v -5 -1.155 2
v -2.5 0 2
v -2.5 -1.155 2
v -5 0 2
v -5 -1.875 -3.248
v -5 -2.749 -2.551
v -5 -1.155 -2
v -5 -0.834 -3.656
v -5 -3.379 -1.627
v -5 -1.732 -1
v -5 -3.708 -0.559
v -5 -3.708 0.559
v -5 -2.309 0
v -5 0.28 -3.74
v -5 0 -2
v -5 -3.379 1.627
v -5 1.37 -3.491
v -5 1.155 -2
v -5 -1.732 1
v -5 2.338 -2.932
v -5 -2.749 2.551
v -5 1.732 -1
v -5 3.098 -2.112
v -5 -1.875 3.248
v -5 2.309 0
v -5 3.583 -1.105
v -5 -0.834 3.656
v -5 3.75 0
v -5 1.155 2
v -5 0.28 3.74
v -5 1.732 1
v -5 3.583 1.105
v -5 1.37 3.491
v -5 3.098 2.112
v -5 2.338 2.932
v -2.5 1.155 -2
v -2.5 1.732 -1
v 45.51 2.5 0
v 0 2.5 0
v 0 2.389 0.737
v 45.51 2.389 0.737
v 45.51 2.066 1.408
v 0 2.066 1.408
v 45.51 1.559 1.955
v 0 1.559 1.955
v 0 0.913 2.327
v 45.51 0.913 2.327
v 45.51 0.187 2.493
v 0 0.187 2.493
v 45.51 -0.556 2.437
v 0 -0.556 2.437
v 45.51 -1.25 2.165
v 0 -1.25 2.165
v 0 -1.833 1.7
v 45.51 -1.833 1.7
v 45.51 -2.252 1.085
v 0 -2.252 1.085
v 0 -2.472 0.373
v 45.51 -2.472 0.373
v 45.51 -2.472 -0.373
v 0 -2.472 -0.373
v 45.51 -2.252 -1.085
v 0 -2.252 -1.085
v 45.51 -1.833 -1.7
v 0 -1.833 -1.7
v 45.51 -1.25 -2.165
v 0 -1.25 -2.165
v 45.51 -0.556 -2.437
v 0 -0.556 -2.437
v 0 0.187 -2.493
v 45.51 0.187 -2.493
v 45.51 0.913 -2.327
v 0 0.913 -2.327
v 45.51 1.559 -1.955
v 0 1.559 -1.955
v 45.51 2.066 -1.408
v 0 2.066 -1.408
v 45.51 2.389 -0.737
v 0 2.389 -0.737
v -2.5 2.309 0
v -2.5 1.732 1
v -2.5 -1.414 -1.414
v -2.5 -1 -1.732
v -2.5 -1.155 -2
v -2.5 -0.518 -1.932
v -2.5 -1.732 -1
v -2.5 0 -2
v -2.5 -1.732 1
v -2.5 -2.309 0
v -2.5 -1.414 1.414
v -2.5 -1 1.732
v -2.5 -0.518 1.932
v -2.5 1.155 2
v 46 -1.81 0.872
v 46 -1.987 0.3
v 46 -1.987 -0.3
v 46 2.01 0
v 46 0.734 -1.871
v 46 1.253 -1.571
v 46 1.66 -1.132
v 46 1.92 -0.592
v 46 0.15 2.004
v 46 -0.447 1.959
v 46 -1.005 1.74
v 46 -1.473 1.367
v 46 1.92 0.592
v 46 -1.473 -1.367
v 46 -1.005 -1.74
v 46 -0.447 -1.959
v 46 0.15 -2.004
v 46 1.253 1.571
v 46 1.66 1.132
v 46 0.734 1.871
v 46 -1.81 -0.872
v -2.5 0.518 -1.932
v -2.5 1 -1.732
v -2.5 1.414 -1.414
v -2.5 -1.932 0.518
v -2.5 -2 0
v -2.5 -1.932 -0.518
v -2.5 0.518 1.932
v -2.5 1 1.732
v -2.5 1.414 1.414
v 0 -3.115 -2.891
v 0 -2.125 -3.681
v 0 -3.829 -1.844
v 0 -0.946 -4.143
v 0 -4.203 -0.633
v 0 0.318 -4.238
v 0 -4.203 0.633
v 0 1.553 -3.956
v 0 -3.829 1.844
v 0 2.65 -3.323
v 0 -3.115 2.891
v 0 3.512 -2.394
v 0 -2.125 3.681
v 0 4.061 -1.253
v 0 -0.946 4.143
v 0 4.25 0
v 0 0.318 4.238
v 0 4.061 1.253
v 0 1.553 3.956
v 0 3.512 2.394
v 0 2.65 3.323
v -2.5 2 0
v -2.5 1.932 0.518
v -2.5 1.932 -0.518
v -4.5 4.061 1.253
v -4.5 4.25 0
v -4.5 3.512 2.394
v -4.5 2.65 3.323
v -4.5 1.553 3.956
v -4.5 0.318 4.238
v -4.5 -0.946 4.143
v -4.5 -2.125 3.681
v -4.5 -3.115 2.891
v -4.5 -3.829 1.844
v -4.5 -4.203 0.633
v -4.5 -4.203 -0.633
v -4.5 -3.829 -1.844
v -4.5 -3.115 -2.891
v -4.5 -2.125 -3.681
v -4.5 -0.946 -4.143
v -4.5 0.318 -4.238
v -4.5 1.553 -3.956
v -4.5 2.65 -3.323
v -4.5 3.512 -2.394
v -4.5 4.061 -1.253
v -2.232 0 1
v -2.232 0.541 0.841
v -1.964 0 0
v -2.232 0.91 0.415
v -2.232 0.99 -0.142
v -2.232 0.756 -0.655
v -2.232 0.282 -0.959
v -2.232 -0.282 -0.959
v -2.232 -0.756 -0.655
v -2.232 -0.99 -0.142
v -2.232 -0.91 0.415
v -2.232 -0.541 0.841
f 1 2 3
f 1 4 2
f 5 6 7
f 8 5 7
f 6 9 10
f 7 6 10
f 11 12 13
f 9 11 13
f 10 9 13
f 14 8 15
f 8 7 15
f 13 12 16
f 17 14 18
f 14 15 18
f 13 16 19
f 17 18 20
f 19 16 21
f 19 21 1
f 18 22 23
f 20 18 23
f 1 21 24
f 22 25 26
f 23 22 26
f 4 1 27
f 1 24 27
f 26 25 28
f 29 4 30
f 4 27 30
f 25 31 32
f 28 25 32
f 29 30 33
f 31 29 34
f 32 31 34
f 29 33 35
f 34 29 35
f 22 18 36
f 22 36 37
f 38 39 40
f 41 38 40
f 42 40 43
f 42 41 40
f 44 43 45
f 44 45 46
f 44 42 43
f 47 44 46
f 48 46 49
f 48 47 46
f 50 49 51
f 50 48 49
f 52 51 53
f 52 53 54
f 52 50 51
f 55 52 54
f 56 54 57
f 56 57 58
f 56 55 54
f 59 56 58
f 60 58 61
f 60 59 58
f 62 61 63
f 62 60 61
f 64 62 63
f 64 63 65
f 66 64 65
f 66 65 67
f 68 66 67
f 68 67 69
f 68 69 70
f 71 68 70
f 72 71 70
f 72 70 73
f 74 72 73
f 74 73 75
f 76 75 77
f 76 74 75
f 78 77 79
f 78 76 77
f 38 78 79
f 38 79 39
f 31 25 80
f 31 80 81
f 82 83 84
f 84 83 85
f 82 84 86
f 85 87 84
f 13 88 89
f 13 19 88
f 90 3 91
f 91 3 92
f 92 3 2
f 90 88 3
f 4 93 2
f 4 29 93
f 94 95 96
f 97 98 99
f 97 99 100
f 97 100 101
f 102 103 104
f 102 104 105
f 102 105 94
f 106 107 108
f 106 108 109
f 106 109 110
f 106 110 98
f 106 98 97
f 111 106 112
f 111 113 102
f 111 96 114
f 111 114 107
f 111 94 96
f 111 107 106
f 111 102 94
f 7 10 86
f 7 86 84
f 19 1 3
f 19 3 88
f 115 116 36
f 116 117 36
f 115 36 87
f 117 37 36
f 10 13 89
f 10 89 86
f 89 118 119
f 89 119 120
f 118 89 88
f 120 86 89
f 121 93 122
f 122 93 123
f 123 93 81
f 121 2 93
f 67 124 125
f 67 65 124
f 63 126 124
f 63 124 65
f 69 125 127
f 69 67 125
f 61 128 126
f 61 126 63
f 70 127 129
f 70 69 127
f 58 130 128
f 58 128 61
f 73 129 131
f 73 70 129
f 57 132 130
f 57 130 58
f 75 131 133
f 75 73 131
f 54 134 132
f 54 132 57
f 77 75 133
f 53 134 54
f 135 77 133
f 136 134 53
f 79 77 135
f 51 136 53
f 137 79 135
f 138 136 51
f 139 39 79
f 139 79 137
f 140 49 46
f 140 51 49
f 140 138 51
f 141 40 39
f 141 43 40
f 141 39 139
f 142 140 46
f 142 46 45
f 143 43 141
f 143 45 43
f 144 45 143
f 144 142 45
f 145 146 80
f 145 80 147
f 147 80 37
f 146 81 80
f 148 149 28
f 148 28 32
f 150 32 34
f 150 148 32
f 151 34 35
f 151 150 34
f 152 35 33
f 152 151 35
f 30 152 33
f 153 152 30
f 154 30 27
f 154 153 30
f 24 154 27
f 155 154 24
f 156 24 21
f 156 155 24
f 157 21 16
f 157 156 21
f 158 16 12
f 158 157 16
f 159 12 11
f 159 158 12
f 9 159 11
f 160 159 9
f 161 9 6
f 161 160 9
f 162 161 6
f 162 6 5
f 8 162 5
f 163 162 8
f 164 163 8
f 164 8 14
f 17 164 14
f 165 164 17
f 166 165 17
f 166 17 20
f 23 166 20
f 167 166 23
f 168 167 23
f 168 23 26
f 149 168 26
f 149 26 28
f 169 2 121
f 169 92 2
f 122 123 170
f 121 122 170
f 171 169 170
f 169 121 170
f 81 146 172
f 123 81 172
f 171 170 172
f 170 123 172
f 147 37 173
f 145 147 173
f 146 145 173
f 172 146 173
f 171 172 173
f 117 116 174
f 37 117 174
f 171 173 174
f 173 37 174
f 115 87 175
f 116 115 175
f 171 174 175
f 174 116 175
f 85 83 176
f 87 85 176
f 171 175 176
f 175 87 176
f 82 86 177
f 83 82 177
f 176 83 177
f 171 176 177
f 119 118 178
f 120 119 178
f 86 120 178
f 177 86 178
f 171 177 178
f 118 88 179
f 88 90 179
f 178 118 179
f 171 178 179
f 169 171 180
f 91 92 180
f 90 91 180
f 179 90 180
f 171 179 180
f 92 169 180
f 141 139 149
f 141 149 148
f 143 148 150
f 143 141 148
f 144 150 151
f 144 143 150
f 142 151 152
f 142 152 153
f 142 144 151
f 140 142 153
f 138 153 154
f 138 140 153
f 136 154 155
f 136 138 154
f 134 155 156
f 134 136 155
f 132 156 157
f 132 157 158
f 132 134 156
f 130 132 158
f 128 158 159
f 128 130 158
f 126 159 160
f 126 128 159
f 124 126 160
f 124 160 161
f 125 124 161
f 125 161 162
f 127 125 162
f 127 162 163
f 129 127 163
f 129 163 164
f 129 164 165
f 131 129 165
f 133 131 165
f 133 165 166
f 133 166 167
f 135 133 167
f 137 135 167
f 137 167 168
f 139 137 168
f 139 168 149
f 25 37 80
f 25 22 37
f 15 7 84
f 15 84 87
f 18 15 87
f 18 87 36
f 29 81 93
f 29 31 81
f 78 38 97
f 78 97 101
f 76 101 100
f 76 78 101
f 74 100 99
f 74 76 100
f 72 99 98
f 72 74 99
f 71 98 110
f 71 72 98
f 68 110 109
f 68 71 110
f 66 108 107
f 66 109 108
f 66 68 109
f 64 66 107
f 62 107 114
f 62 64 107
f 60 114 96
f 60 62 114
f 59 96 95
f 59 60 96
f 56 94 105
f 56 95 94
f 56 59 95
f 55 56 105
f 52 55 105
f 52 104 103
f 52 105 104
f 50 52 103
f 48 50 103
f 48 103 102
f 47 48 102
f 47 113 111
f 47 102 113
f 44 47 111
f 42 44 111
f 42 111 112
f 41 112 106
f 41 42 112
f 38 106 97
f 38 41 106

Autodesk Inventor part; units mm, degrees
sketch "Sketch_1" plane through (0, 0, 0) normal (0, 0, 1) x (1, 0, 0)
  line L0 (22, 0) -> (-5, 0)
  line L1 (-5, 0) -> (-5, 3.75)
  line L2 (-5, 3.75) -> (-4.5, 4.25)
  line L3 (-4.5, 4.25) -> (0, 4.25)
  line L4 (0, 4.25) -> (0, 2.5)
  line L5 (0, 2.5) -> (45.5095, 2.5)
  line L6 (45.5095, 2.5) -> (46, 2.0095)
  line L7 (46, 2.0095) -> (46, 0)
  line L8 (46, 0) -> (-5, 0)
  dimension "d14" = 45
  dimension "d16" = 45
  dimension "d17" = 4.5
  dimension "d18" = 3.75
  dimension "d19" = 2.0095
  dimension "d20" = 46
revolve "Revolution1" add sketch "Sketch_1" angle 360 about axis through (22, 0, 0) along (1, 0, 0)
thread "Thread1" size "M5x0.8" class "6g" standard "ISO Metric profile" length 45.2 offset 0.8
sketch "Sketch2" plane through (-5, 0, 0) normal (-1, 0, 0) x (0, 0, 1)
  point P0 (0, 0)
hole "Hole1" at (-5, 0, 0) direction (1, 0, 0) diameter 4 depth 2.5 tip angle 150
sketch "Sketch_3" plane through (-5, 0, 0) normal (1, 0, 0) x (0, 0, -1)
  line L0 (-2, -1.1547) -> (0, -2.3094)
  line L1 (0, -2.3094) -> (2, -1.1547)
  line L2 (2, -1.1547) -> (2, 1.1547)
  line L3 (2, 1.1547) -> (0, 2.3094)
  line L4 (0, 2.3094) -> (-2, 1.1547)
  line L5 (-2, 1.1547) -> (-2, -1.1547)
extrude "Extrusion1" cut sketch "Sketch_3" along normal blind 2.5
ref_plane "bolt_XY" through (0, 0, 0) normal (1, 0, 0) x (0, 0, -1)
ref_plane "bolt_YZ" through (0, 0, 0) normal (0, 0, -1) x (0, 1, 0)
ref_plane "bolt_ZX" through (0, 0, 0) normal (0, 1, 0) x (1, 0, 0)
ref_plane "nut_XY" through (22, 0, 0) normal (1, 0, 0) x (0, 0, -1)
ref_plane "nut_YZ" through (22, 0, 0) normal (0, 0, -1) x (0, 1, 0)
ref_plane "nut_ZX" through (22, 0, 0) normal (0, 1, 0) x (1, 0, 0)
properties part number "SCB5-46" material "鋼"
